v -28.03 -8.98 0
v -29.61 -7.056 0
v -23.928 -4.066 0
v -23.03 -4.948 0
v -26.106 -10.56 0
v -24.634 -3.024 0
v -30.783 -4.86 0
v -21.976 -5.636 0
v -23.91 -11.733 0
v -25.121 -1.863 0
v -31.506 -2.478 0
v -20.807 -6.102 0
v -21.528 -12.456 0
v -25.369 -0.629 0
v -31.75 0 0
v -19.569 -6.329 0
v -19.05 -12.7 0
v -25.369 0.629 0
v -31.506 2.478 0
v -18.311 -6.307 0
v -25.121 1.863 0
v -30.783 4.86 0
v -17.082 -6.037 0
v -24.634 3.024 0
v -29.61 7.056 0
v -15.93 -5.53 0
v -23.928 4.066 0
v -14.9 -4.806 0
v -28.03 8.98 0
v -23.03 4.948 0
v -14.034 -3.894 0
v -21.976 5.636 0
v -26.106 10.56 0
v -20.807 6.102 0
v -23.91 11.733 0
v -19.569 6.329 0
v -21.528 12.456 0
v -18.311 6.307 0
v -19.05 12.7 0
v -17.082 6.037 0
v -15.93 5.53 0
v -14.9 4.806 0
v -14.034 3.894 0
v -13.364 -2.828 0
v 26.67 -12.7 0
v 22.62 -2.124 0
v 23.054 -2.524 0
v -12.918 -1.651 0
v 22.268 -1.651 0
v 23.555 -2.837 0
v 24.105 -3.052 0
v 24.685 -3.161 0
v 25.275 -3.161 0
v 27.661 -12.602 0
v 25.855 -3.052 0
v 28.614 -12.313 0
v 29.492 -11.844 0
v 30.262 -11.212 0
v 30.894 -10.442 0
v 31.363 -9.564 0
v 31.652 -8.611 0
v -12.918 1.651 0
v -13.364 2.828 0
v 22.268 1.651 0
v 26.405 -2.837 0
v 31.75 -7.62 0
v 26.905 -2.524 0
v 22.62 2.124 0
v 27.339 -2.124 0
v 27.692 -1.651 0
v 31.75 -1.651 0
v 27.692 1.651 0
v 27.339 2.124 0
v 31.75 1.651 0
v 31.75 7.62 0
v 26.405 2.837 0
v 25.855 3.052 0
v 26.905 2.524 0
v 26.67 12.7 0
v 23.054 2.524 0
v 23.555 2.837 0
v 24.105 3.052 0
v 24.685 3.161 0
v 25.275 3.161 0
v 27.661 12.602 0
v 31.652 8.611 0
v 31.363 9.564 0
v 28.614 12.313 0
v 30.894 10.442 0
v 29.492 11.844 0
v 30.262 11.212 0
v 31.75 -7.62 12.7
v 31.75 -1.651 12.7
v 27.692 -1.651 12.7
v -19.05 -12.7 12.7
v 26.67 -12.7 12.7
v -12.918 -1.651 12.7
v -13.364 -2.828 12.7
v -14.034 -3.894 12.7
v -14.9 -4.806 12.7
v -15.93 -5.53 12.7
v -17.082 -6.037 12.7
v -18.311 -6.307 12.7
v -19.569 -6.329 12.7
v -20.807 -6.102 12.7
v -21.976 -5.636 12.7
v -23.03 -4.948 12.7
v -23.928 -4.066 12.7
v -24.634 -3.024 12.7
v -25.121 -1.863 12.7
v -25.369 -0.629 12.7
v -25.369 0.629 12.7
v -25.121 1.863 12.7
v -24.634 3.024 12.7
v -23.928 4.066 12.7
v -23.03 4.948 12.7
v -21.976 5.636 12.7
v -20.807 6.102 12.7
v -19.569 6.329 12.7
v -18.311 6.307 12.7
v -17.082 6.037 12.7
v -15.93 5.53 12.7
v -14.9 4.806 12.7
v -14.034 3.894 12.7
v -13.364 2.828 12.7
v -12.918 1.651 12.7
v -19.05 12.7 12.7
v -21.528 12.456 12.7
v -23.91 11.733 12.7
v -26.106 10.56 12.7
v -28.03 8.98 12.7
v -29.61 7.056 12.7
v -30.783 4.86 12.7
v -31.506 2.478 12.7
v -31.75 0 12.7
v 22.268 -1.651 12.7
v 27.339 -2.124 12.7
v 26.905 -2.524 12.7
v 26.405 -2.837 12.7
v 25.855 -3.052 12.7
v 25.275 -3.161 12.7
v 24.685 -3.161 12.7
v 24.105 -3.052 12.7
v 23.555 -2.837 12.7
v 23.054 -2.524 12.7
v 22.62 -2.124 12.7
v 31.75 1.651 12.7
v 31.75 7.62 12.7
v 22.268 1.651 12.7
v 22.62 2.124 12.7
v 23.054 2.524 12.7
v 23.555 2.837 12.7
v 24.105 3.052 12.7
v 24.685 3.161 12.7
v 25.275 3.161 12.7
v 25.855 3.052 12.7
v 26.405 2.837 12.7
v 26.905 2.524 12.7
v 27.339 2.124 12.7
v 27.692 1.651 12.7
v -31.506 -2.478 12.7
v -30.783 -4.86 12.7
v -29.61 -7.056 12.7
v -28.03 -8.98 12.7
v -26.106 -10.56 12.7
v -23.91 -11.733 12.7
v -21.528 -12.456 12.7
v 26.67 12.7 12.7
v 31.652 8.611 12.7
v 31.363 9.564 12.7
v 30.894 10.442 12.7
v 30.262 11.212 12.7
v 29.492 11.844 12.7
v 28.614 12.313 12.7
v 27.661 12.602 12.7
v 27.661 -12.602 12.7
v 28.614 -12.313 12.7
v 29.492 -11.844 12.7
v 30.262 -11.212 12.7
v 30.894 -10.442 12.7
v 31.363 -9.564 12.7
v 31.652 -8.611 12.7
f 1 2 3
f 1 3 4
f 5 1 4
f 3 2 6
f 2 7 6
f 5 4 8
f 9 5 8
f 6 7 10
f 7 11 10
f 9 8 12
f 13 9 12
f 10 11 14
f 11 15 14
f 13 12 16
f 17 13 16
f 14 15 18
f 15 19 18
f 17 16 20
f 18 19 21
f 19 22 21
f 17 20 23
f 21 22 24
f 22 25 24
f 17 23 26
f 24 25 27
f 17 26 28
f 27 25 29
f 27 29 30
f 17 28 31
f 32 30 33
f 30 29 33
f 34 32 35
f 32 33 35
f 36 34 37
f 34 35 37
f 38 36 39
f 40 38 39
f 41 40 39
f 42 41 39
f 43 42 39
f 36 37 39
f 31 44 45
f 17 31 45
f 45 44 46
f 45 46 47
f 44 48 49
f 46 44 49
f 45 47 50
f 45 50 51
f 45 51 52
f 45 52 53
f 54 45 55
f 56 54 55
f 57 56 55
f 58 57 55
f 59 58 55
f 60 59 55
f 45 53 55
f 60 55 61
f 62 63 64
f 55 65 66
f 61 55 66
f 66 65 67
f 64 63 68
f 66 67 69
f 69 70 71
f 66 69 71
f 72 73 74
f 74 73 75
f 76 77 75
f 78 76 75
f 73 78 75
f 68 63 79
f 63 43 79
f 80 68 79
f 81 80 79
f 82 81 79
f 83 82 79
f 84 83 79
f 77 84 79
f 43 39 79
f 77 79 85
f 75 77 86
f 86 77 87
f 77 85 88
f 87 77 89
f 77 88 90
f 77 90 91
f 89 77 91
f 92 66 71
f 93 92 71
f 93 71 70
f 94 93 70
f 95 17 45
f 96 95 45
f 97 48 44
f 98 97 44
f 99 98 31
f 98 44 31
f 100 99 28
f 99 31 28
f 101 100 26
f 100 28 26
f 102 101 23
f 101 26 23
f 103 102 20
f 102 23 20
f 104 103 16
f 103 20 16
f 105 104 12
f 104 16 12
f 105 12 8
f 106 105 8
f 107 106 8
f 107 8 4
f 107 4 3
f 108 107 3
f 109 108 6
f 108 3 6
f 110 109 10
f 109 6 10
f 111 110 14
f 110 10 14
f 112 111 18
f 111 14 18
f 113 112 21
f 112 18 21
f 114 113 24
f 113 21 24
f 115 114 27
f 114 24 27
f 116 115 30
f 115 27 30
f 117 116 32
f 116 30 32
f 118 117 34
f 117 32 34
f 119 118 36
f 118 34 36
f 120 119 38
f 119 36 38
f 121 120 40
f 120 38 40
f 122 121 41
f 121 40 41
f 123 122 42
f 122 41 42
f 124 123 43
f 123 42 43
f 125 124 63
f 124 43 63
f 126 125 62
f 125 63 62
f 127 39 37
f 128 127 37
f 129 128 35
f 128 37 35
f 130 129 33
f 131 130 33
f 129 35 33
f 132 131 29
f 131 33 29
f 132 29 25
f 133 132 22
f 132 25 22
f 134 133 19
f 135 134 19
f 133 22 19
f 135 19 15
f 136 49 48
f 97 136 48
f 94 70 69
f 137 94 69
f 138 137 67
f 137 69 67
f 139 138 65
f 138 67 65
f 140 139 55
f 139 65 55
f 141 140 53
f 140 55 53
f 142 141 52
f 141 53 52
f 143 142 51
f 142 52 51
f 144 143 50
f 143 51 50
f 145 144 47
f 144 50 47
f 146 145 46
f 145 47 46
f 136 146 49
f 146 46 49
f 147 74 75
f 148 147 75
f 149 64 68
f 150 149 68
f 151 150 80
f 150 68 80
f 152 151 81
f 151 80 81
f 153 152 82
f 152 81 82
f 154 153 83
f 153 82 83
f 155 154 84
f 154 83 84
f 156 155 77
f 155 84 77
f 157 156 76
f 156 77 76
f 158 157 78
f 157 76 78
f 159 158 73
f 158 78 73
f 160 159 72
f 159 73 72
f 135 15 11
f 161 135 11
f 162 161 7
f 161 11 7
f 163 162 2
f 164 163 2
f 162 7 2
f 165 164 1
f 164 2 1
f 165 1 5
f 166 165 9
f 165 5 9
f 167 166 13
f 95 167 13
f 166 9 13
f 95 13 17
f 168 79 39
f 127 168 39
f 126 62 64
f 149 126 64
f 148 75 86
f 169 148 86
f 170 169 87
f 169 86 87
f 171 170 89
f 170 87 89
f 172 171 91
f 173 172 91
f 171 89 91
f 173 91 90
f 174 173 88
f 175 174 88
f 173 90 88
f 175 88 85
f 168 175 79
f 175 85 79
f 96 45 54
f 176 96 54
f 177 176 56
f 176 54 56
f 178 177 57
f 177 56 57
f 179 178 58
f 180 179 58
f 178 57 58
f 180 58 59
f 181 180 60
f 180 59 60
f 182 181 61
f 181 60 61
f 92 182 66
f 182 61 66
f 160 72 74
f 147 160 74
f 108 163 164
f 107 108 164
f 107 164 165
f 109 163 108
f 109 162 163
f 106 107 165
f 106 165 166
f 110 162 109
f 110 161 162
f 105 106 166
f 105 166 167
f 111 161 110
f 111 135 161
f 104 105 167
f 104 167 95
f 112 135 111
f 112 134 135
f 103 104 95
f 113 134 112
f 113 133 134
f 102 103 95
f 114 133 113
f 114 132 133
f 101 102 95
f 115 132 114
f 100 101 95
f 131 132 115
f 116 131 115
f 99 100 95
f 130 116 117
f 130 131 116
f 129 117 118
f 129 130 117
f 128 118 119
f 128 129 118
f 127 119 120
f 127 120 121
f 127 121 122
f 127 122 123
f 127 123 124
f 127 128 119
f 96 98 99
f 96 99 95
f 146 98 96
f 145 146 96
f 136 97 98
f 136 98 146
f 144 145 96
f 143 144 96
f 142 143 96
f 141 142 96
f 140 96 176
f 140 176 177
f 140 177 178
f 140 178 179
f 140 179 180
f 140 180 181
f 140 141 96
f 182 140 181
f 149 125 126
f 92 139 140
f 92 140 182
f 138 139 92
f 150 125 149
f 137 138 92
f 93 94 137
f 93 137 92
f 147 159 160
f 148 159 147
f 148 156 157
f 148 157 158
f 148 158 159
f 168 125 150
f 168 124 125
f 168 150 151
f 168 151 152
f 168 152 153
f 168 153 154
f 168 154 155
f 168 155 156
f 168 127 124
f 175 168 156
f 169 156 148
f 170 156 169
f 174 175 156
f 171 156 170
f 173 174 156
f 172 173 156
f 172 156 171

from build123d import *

# Parameters (mm, degrees)
F1_DEPTH = 12.7


with BuildPart() as f1:
    # F0 (on Top) → F1 (new body)
    with BuildSketch(Plane.XY):
        with BuildLine():
            Line((-19.05, -12.7), (26.67, -12.7))
            ThreePointArc((26.67, -12.7), (30.262102, -11.212102), (31.75, -7.62))
            Line((31.75, -7.62), (31.75, -1.651))
            Line((31.75, -1.651), (27.691787, -1.651))
            ThreePointArc((27.691787, -1.651), (24.979809, -3.175), (22.267831, -1.651))
            Line((22.267831, -1.651), (-12.918385, -1.651))
            ThreePointArc((-12.918385, -1.651), (-25.4, 0), (-12.918385, 1.651))
            Line((-12.918385, 1.651), (22.267831, 1.651))
            ThreePointArc((22.267831, 1.651), (24.979809, 3.175), (27.691787, 1.651))
            Line((27.691787, 1.651), (31.75, 1.651))
            Line((31.75, 1.651), (31.75, 7.62))
            ThreePointArc((31.75, 7.62), (30.262102, 11.212102), (26.67, 12.7))
            Line((26.67, 12.7), (-19.05, 12.7))
            ThreePointArc((-19.05, 12.7), (-28.030256, 8.980256), (-31.75, 0))
            ThreePointArc((-31.75, 0), (-28.030256, -8.980256), (-19.05, -12.7))
        make_face()
    extrude(amount=F1_DEPTH)


solid = f1.part
